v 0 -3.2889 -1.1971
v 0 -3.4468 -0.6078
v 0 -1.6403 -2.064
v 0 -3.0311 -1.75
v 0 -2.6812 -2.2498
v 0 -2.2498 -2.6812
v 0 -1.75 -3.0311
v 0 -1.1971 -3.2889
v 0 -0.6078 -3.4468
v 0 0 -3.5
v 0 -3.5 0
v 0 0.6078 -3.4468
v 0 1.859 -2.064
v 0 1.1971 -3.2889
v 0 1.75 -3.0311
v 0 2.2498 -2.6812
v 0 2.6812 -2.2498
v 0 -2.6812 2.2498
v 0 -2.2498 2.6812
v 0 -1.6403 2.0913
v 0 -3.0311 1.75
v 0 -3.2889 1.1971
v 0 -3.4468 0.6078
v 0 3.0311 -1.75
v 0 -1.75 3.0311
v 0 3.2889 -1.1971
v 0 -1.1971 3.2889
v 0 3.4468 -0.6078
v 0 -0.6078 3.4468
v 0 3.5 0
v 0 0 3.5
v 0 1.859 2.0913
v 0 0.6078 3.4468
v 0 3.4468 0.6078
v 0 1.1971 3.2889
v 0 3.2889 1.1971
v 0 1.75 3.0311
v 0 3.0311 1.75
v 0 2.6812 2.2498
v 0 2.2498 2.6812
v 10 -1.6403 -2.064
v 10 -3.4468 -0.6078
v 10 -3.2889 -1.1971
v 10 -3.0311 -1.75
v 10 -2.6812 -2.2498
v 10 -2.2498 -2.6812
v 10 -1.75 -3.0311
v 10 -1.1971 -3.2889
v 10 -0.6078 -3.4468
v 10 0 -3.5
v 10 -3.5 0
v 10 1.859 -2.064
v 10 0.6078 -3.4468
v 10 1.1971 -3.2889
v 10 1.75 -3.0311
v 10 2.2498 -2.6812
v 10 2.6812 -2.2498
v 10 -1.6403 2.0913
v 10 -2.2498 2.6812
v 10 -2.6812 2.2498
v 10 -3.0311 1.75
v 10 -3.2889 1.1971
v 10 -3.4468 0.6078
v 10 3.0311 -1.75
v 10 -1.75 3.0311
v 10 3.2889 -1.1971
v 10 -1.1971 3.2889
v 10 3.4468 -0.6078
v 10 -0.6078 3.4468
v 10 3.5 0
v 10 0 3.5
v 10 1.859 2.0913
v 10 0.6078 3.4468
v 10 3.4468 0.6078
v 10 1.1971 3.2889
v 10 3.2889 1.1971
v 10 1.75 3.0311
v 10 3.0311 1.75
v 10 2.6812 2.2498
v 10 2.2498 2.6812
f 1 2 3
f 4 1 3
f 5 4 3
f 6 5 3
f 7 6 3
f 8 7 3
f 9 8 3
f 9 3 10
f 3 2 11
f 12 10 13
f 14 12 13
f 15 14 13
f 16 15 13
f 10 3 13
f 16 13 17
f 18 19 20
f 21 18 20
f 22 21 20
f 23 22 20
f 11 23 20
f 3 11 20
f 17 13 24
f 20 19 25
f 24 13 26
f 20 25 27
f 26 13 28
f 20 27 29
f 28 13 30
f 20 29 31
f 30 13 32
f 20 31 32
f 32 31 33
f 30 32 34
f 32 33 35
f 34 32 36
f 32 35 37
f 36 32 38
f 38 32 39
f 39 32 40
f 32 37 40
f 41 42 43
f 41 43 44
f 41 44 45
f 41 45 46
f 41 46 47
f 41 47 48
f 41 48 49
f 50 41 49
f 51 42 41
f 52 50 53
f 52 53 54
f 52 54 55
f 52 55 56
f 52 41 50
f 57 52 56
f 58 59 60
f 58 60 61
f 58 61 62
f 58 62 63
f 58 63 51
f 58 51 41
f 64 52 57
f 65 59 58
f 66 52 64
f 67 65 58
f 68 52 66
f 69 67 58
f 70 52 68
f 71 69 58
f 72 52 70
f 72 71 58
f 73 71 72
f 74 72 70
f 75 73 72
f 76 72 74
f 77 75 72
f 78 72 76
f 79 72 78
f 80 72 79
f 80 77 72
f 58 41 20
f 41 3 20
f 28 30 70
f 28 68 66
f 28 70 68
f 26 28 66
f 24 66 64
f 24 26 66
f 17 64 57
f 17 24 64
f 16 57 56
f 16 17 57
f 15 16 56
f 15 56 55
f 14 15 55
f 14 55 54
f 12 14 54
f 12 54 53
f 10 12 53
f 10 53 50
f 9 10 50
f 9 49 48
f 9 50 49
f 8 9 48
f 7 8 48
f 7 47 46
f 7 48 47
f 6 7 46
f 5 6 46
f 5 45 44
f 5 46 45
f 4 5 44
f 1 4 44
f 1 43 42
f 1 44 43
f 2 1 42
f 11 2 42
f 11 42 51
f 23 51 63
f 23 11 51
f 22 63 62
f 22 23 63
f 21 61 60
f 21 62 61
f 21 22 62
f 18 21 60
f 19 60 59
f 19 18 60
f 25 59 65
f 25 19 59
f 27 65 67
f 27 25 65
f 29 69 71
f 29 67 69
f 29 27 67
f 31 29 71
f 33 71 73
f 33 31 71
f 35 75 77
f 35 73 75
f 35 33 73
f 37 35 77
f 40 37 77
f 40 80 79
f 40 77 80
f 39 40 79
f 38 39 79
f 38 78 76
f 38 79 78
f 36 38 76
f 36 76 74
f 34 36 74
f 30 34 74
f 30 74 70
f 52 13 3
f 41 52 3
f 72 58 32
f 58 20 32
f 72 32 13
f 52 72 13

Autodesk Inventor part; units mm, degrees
ref_plane "YZ Plane" through (0, 0, 0) normal (1, 0, 0) x (0, 1, 0)
ref_plane "XZ Plane" through (0, 0, 0) normal (0, 1, 0) x (-1, 0, 0)
ref_plane "XY Plane" through (0, 0, 0) normal (0, 0, 1) x (1, 0, 0)
sketch "Sketch1" plane through (0, 0, 0) normal (1, 0, 0) x (0, 1, 0)
  circle A0 centre (0, 0) radius 3.5
  dimension "d7" = 7
extrude "Extrusion1" add sketch "Sketch1" along normal blind 10
sketch "Sketch2" plane through (0, 0, 0) normal (-1, 0, 0) x (0, 0, 1)
  line L0 (2.0913, 1.859) -> (-2.064, 1.859)
  line L1 (-2.064, 1.859) -> (-2.064, -1.6403)
  line L2 (-2.064, -1.6403) -> (2.0913, -1.6403)
  line L3 (2.0913, -1.6403) -> (2.0913, 1.859)
  point P0 (0, 0)
sketch "Sketch4" plane through (10, 0, 0) normal (1, 0, 0) x (0, 0, -1)
  point P0 (0, 0)
extrude "Extrusion2" cut sketch "Sketch2" against normal blind 16.25
properties part number "Wkp 01.03"
